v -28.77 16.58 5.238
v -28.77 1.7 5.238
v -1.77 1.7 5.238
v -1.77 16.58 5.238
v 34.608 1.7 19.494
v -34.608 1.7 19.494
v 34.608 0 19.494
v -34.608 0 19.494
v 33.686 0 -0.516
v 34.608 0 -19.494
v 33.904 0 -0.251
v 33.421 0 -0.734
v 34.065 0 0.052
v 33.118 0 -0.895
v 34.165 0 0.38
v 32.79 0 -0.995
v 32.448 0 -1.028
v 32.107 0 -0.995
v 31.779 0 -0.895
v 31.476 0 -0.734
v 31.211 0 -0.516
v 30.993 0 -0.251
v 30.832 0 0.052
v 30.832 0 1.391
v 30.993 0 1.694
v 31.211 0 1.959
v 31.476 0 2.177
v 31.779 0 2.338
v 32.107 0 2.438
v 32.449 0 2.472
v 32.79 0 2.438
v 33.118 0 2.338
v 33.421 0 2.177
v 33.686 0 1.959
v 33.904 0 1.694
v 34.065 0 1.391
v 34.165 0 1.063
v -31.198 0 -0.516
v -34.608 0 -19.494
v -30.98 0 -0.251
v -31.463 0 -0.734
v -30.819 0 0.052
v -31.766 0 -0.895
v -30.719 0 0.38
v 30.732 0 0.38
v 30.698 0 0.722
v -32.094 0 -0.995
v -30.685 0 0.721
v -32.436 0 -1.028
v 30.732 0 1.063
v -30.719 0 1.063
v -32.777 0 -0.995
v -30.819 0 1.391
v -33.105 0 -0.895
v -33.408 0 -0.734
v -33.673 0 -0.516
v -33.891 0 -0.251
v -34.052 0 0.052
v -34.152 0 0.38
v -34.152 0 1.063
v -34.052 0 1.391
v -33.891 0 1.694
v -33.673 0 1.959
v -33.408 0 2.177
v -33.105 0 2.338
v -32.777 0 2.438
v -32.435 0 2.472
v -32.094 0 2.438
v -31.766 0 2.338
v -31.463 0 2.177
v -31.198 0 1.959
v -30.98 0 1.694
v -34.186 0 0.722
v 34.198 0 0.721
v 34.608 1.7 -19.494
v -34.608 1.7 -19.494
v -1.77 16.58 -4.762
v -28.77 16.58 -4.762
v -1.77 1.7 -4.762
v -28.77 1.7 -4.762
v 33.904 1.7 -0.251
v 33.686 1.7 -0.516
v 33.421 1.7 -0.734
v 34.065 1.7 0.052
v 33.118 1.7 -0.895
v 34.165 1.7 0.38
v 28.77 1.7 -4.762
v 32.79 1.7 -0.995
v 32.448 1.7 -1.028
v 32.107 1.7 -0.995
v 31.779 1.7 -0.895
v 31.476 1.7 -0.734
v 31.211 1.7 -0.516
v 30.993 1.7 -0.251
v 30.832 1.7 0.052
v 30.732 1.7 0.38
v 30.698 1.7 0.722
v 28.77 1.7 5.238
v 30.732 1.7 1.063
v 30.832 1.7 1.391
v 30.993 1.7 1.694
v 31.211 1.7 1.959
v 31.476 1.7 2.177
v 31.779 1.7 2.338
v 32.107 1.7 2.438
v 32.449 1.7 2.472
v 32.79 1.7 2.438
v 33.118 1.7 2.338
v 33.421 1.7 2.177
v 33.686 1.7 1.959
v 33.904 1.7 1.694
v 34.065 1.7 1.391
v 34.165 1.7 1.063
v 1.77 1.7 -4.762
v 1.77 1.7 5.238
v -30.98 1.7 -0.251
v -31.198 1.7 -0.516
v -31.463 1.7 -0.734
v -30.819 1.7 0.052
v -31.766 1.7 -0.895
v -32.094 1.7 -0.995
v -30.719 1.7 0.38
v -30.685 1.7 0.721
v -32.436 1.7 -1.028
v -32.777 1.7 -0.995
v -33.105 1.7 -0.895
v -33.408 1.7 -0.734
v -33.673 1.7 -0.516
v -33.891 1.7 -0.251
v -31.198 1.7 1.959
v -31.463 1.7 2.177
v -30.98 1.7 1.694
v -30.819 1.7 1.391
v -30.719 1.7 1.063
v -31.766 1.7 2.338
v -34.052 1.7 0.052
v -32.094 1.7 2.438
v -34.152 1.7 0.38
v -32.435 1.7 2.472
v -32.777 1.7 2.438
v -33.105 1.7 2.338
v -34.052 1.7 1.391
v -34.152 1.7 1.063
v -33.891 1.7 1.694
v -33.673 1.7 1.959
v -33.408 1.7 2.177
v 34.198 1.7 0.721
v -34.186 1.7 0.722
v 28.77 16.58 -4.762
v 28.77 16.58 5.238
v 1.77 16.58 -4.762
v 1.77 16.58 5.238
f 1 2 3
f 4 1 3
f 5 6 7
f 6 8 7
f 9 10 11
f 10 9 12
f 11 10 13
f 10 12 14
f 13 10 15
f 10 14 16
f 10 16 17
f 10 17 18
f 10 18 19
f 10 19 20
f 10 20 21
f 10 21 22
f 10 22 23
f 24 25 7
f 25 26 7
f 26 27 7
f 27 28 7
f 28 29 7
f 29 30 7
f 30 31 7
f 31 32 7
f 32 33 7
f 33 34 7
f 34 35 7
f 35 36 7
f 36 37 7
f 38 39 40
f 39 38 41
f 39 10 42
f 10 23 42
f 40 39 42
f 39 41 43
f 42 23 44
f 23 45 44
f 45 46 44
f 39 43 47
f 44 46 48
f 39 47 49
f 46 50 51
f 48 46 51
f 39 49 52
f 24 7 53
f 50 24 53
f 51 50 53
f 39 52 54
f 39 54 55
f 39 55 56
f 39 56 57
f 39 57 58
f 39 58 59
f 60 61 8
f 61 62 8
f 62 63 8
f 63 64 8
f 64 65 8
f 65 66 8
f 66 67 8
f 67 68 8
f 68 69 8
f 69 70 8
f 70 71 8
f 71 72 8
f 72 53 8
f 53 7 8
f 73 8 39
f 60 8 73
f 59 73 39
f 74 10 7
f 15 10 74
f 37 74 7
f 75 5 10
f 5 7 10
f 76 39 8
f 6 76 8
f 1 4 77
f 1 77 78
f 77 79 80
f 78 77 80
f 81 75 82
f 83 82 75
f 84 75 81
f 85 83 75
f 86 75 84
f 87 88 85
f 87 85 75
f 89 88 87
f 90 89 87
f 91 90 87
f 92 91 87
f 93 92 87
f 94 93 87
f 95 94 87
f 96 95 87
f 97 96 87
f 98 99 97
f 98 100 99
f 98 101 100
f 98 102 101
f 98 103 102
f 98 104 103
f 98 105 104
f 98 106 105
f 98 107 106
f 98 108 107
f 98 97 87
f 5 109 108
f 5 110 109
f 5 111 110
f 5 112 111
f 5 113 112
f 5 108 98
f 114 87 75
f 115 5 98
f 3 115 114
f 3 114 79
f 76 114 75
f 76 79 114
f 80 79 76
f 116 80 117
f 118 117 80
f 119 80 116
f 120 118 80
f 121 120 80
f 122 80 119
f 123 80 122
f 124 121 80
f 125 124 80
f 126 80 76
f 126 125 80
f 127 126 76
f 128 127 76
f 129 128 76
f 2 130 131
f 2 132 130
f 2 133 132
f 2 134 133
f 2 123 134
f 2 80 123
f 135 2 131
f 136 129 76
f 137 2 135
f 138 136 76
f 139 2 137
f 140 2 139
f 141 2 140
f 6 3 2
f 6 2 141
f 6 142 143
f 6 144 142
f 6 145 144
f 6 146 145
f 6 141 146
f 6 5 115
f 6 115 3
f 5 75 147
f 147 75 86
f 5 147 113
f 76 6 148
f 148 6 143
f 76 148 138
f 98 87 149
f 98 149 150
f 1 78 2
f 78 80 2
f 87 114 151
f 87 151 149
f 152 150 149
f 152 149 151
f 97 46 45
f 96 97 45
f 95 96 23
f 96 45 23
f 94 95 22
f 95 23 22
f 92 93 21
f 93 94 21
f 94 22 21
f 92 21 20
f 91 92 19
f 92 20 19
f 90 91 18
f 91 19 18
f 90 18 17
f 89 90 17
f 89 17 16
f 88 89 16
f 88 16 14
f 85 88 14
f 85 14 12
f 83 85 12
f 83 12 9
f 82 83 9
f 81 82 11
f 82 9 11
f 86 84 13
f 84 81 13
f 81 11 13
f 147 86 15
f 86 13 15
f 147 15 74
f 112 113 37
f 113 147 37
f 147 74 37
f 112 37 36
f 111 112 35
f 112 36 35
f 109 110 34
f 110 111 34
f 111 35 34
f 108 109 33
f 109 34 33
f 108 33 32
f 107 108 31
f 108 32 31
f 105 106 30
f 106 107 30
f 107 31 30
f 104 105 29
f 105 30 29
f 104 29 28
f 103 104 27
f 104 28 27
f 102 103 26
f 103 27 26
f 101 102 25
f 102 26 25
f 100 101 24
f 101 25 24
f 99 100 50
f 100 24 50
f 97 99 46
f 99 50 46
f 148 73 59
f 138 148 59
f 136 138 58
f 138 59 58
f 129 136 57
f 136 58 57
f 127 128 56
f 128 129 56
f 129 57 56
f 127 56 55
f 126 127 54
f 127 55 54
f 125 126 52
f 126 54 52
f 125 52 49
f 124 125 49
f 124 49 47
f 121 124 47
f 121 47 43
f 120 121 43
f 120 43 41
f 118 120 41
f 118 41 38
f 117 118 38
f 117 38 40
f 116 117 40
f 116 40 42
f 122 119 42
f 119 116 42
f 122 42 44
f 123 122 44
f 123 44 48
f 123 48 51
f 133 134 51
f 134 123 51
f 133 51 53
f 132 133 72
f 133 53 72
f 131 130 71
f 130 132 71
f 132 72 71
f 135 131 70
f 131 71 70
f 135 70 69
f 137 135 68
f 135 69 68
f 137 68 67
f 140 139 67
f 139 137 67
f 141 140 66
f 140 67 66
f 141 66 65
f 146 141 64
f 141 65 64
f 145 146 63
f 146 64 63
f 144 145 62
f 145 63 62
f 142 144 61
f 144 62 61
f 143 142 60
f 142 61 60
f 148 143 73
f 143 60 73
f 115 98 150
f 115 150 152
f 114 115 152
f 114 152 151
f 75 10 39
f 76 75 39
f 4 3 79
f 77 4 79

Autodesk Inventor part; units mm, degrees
ref_plane "YZ Plane" through (0, 0, 0) normal (1, 0, 0) x (0, 1, 0)
ref_plane "XZ Plane" through (0, 0, 0) normal (0, 1, 0) x (-1, 0, 0)
ref_plane "XY Plane" through (0, 0, 0) normal (0, 0, 1) x (1, 0, 0)
sketch "Sketch1" plane through (0, 0, 0) normal (0, 1, 0) x (-1, 0, 0)
  line L0 (34.6075, 19.4945) -> (-34.6075, 19.4945)
  line L1 (-34.6075, 19.4945) -> (-34.6075, -19.4945)
  line L2 (-34.6075, -19.4945) -> (34.6075, -19.4945)
  line L3 (34.6075, -19.4945) -> (34.6075, 19.4945)
  line L4 (-34.6075, 19.4945) -> (34.6075, -19.4945) construction
  circle A0 centre (32.4355, 0.7215) radius 1.75
  circle A1 centre (-32.4485, 0.7215) radius 1.75
  line L5 (28.7695, 5.2375) -> (1.7695, 5.2375)
  line L6 (1.7695, 5.2375) -> (1.7695, -4.7625)
  line L7 (1.7695, -4.7625) -> (28.7695, -4.7625)
  line L8 (28.7695, -4.7625) -> (28.7695, 5.2375)
  line L9 (28.7695, 5.2375) -> (1.7695, -4.7625) construction
  line L10 (1.7695, 5.2375) -> (28.7695, -4.7625) construction
  line L11 (-28.7695, 5.2375) -> (-1.7695, 5.2375)
  line L12 (-1.7695, 5.2375) -> (-1.7695, -4.7625)
  line L13 (-1.7695, -4.7625) -> (-28.7695, -4.7625)
  line L14 (-28.7695, -4.7625) -> (-28.7695, 5.2375)
  point P0 (0, 0)
  point P1 (15.2695, 0.2375)
  dimension "d0" = 69.215
  dimension "d1" = 38.989
  dimension "d2" = 3.5
  dimension "d3" = 2.172
  dimension "d4" = 20.216
  dimension "d5" = 27
  dimension "d6" = 10
  dimension "d18" = 64.884
extrude "Extrusion1" add sketch "Sketch1" along normal blind 1.7
extrude "Extrusion2" add sketch "Sketch1" along normal blind 16.58 contours L8 L7 L6 L5 | L11 L12 L13 L14
sketch "Sketch2" plane through (0, 1.7, 0) normal (0, 1, 0) x (1, 0, 0)
  line L0 (-16.1466, -9.4421) -> (18.9981, -9.4421) construction
  line L1 (18.9981, -9.4421) -> (18.9981, -13.0896) construction
  line L2 (18.9981, -13.0896) -> (-16.1466, -13.0896) construction
  line L3 (-16.1466, -13.0896) -> (-16.1466, -9.4421) construction
  point P0 (0, 0)
properties part number "powerdistv2"
